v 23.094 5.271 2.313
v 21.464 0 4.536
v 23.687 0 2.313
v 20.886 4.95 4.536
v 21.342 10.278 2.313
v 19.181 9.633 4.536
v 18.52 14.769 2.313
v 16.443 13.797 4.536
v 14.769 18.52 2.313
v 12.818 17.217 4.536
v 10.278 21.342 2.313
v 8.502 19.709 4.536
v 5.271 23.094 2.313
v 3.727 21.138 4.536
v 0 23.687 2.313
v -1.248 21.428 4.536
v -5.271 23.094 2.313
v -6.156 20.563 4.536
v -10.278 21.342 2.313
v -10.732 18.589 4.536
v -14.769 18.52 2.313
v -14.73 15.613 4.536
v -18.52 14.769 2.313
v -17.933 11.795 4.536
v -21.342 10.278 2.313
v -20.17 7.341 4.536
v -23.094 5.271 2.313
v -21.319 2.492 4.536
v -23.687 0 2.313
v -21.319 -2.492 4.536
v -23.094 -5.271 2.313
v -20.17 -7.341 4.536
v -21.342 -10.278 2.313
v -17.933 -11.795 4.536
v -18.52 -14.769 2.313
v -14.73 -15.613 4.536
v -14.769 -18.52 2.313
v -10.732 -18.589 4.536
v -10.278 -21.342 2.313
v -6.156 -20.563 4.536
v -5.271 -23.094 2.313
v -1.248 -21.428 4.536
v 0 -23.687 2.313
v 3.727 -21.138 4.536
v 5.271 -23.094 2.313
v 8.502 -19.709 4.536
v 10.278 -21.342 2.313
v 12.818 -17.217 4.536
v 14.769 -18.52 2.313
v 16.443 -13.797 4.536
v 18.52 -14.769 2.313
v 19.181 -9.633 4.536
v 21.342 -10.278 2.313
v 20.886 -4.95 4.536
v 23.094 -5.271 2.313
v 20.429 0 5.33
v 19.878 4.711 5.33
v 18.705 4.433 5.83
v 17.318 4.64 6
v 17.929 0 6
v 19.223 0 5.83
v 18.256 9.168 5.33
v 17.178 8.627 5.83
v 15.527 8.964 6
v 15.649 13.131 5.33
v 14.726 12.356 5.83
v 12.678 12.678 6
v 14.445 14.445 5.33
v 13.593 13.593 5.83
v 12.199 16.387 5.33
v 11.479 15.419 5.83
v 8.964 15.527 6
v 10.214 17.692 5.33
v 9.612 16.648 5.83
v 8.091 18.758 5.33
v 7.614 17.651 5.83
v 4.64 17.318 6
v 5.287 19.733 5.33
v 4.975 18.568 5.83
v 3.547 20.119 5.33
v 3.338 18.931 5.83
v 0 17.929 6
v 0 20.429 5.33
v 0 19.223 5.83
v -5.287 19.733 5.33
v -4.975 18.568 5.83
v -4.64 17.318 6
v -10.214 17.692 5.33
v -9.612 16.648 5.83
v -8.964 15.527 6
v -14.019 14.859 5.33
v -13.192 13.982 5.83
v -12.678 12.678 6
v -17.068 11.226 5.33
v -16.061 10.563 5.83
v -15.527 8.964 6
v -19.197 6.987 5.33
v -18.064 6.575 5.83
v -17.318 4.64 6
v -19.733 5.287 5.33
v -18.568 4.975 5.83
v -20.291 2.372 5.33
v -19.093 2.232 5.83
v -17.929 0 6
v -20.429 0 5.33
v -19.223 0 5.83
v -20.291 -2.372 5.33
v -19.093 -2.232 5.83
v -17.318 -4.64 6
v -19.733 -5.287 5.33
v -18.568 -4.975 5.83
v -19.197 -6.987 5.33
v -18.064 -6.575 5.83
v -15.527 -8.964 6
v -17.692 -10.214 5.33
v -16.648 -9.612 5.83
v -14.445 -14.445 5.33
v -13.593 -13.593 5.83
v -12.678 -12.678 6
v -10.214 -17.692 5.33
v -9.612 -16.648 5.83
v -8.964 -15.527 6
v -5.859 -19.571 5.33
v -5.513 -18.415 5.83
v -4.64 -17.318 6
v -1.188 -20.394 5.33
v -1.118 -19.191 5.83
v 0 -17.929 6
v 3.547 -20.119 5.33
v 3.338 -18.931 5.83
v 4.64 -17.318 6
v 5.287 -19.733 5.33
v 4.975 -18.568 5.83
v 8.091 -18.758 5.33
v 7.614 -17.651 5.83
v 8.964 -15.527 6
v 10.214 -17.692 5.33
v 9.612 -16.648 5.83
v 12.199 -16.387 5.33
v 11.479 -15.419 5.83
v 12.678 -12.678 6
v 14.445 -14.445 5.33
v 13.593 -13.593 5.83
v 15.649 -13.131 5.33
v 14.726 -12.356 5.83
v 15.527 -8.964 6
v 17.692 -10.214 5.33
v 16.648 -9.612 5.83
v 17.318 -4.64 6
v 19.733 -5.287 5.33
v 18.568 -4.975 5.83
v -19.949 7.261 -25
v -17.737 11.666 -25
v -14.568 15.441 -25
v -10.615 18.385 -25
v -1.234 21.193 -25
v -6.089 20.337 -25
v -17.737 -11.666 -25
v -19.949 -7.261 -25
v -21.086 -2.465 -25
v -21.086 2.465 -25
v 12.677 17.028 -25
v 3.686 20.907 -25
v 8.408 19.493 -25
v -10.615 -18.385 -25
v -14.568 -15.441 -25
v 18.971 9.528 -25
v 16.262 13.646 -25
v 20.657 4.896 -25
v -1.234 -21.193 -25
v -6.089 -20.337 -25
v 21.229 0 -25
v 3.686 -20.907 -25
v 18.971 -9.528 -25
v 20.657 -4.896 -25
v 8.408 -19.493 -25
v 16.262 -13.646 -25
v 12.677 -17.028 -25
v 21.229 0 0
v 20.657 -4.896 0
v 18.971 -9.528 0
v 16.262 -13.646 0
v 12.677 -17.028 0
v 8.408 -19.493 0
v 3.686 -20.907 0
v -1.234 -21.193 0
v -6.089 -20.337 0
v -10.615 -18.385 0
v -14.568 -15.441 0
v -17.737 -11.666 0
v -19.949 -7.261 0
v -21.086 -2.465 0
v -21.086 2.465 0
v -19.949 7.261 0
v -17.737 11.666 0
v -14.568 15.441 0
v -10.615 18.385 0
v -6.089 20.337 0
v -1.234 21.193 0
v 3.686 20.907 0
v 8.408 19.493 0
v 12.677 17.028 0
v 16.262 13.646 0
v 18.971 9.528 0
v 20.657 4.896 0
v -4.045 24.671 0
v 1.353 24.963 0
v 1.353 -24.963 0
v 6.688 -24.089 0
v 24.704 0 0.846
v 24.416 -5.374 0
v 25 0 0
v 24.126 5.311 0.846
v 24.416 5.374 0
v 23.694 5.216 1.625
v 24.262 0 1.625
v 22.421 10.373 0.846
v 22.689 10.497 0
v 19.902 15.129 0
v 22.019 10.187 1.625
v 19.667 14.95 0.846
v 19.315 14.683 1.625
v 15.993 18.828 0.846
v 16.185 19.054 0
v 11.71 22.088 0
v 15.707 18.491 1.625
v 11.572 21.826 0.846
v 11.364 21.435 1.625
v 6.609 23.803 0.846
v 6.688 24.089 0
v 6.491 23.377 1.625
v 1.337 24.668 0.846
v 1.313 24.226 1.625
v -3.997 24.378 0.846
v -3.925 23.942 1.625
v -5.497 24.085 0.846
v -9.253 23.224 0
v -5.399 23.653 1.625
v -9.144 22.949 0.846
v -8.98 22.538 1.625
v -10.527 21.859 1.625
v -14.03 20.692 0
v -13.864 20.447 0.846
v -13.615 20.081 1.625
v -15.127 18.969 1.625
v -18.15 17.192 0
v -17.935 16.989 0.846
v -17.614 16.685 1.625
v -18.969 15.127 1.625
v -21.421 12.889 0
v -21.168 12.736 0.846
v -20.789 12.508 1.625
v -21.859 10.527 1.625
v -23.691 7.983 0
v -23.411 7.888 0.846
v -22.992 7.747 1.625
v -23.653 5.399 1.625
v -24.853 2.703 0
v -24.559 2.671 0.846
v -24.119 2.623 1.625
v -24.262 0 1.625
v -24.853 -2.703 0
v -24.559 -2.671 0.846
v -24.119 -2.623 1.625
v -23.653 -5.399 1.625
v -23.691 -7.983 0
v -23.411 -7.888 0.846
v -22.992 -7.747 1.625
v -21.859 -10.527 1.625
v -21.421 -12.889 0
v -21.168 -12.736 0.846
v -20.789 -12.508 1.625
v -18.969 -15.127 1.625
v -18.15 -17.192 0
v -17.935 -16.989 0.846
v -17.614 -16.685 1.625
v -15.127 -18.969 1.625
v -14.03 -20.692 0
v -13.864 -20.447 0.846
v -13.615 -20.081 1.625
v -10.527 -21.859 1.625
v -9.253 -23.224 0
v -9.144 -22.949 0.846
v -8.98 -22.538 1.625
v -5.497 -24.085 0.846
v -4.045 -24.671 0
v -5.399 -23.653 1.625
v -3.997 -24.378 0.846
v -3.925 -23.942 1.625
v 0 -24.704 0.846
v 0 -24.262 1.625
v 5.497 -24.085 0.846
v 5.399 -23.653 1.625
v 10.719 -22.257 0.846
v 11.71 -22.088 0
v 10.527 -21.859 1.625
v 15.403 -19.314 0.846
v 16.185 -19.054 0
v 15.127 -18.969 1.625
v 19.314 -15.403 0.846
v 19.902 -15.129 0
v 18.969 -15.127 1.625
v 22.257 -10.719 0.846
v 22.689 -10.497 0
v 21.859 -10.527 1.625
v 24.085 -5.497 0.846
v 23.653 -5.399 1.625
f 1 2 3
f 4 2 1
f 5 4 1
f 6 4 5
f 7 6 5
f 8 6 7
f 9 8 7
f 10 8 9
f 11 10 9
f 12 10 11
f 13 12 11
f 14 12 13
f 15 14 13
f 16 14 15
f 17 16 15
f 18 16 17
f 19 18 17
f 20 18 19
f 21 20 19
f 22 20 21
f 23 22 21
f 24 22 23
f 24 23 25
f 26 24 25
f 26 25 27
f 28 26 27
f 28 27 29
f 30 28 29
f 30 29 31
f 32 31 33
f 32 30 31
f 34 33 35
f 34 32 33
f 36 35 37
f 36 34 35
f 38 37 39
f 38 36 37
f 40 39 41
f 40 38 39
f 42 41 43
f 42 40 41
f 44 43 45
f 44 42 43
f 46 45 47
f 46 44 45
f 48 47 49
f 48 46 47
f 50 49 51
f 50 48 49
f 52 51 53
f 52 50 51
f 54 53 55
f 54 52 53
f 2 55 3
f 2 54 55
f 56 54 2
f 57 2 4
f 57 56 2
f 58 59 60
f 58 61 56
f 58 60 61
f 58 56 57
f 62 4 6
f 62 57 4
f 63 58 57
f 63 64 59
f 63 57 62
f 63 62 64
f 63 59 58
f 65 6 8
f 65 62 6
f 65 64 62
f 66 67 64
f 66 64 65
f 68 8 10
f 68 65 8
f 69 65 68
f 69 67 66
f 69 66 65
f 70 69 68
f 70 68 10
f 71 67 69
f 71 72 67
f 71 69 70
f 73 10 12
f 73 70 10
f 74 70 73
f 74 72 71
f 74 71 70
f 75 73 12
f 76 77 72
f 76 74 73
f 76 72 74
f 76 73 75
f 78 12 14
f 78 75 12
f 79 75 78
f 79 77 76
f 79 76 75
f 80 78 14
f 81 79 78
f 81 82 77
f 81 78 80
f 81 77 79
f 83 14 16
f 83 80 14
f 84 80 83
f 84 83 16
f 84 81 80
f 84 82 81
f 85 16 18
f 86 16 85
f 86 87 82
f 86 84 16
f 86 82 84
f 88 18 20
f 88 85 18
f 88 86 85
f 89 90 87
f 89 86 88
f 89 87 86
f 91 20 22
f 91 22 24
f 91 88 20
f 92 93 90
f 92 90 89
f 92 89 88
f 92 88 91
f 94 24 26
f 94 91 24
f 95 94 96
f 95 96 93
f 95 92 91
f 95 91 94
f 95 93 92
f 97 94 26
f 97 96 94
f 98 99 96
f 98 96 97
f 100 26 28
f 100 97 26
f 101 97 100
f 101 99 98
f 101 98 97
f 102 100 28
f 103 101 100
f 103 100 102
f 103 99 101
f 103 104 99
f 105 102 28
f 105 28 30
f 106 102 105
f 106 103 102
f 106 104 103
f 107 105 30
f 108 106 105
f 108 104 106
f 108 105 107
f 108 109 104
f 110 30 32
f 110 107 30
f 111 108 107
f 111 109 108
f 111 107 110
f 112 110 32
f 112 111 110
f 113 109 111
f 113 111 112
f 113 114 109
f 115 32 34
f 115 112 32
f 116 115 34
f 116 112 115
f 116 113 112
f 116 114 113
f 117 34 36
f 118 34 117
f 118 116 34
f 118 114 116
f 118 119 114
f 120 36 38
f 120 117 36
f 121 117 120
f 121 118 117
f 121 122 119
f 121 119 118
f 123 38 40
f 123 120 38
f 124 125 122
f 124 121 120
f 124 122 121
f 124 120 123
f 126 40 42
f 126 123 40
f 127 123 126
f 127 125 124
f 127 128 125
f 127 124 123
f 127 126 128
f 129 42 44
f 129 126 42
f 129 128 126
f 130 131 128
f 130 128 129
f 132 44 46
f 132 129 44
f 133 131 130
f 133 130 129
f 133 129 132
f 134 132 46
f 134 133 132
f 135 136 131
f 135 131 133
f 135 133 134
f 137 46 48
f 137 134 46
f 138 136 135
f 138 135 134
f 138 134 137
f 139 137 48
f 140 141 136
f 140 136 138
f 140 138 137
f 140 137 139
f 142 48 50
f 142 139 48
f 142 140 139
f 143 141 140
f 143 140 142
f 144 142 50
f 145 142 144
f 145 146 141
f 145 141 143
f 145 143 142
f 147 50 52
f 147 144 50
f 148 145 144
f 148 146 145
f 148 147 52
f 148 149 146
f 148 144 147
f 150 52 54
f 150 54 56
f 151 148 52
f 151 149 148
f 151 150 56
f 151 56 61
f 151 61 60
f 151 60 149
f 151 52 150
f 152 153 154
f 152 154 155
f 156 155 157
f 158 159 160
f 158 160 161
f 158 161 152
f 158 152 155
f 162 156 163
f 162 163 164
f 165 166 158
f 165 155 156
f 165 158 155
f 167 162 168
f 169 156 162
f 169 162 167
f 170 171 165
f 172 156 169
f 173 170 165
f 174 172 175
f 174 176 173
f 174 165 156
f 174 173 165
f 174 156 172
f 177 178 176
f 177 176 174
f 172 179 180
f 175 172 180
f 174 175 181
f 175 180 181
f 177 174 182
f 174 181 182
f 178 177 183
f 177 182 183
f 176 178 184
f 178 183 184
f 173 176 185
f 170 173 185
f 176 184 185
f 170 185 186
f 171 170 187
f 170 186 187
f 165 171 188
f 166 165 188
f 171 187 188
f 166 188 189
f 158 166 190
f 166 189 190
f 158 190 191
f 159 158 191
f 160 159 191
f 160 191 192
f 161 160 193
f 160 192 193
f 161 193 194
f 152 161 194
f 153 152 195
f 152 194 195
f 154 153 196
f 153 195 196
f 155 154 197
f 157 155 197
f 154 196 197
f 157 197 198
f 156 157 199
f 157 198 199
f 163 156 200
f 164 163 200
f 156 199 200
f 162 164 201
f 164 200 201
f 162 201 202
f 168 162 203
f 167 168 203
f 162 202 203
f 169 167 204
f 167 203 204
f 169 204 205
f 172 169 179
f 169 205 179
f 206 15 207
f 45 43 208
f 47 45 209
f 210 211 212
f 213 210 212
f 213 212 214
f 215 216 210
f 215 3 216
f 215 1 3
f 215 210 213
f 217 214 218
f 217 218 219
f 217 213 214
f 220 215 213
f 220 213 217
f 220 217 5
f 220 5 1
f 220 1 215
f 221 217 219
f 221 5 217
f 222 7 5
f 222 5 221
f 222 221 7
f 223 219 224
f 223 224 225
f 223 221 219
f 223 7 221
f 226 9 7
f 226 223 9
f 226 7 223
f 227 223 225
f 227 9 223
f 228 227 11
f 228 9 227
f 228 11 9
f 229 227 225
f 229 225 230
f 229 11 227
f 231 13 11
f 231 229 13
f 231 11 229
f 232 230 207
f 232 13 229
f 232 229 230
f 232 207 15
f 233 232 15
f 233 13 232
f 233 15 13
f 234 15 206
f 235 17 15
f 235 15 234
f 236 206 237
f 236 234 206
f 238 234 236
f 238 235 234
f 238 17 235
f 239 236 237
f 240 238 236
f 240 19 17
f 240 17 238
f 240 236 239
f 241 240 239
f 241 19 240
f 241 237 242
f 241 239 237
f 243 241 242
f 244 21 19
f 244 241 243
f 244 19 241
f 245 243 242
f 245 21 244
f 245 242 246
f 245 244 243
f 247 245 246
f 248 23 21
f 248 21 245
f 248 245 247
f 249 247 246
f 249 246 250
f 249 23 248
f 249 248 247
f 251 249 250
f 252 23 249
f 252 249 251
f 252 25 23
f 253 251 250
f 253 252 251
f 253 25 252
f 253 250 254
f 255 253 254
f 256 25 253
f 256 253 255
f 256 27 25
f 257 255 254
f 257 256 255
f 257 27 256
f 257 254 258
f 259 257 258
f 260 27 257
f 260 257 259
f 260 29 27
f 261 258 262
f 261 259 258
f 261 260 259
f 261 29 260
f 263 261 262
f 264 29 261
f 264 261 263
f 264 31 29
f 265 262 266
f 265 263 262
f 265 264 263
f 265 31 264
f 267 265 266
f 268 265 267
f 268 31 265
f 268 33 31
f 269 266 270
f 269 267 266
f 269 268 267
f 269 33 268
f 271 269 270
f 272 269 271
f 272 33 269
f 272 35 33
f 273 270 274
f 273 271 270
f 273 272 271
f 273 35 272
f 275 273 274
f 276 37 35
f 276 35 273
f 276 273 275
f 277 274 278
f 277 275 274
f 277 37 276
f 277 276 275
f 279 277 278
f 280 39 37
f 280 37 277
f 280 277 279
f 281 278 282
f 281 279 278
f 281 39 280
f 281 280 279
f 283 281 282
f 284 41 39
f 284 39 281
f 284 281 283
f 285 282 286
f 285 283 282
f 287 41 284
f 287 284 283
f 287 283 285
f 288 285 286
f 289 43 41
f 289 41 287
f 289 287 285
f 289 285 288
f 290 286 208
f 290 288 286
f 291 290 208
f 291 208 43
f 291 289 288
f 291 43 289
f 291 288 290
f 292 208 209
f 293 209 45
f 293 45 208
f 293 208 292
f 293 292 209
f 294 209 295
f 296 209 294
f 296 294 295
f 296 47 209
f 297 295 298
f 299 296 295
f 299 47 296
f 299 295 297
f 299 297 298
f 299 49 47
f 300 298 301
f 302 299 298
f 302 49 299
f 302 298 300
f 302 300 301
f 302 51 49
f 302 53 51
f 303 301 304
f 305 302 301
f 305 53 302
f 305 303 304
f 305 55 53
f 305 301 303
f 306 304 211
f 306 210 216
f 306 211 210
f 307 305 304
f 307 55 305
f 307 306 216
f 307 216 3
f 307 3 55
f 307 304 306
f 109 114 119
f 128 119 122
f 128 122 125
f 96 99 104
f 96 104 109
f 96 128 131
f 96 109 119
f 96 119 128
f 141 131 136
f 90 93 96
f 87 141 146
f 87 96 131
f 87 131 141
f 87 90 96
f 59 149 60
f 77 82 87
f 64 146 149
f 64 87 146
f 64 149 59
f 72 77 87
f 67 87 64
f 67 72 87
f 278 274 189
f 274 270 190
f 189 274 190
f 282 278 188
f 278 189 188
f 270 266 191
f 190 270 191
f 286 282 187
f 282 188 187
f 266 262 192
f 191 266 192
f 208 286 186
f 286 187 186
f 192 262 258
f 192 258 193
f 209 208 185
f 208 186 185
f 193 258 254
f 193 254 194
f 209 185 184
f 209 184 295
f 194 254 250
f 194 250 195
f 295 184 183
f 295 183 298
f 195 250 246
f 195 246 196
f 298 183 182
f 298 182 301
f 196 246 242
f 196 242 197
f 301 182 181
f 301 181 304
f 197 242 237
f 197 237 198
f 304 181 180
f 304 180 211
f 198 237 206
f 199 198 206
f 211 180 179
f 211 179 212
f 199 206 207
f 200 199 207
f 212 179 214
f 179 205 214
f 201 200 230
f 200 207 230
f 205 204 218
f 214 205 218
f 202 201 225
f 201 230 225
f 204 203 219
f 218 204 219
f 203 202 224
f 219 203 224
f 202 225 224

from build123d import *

# Parameters (mm, degrees)
F0_R     = 25
F1_DEPTH = 6
F2_R     = 21.4280280098
F3_DEPTH = 3
F4_SIZE  = 5
F6_R     = 21.8410066176
F7_DEPTH = 4
F8_R     = 21.2290439381
F9_DEPTH = 25


# Not quite as in the source:
# - a fillet or chamfer that OpenCascade refuses, or shapes differently, is made with other operations: its cross-section is extruded or revolved along the edge and cut away or added


with BuildPart() as f1:
    # F0 (on Top) → F1 (new body)
    with BuildSketch(Plane.XY):
        Circle(F0_R)
    extrude(amount=F1_DEPTH)

    # F2 (on face) → F3 (join)
    with BuildSketch(Plane.XY.offset(6)):
        Circle(F2_R)
    extrude(amount=-F3_DEPTH)

    # F4
    f4_edges = [f1.edges().sort_by_distance(p)[0] for p in [
        (-25, 0, 6),
    ]]
    chamfer(f4_edges, length=F4_SIZE)

    # F5: fillet of radius 5 on 3 edges, made by hand

    # F5_s1 → F5_t2 (revolve, cut)
    with BuildSketch(Plane.XZ):
        with BuildLine():
            ThreePointArc((25, 0), (24.5002551285, 1.2451619378), (23.687395822, 2.312604178))
            Line((23.687395822, 2.312604178), (25, 1))
            Line((25, 1), (25, 0))
        make_face()
    revolve(axis=Axis((0, 0, 1), (0, 0, 1)), mode=Mode.SUBTRACT)

    # F5_s3 → F5_t4 (revolve, cut)
    with BuildSketch(Plane.XZ):
        with BuildLine():
            ThreePointArc((21.4644660941, 4.5355339059), (19.84234935, 5.6193976626), (17.9289321881, 6))
            Line((17.9289321881, 6), (20, 6))
            Line((20, 6), (21.4644660941, 4.5355339059))
        make_face()
    revolve(axis=Axis((0, 0, 6), (0, 0, 1)), mode=Mode.SUBTRACT)

    # F6 (on face) → F7 (join)
    with BuildSketch(Plane(origin=(0, 0, 0), x_dir=(1, 0, 0), z_dir=(0, 0, -1))):
        Circle(F6_R)
    extrude(amount=-F7_DEPTH)

    # F8 (on face) → F9 (join)
    with BuildSketch(Plane(origin=(0, 0, 0), x_dir=(1, 0, 0), z_dir=(0, 0, -1))):
        Circle(F8_R)
    extrude(amount=F9_DEPTH)


solid = f1.part
